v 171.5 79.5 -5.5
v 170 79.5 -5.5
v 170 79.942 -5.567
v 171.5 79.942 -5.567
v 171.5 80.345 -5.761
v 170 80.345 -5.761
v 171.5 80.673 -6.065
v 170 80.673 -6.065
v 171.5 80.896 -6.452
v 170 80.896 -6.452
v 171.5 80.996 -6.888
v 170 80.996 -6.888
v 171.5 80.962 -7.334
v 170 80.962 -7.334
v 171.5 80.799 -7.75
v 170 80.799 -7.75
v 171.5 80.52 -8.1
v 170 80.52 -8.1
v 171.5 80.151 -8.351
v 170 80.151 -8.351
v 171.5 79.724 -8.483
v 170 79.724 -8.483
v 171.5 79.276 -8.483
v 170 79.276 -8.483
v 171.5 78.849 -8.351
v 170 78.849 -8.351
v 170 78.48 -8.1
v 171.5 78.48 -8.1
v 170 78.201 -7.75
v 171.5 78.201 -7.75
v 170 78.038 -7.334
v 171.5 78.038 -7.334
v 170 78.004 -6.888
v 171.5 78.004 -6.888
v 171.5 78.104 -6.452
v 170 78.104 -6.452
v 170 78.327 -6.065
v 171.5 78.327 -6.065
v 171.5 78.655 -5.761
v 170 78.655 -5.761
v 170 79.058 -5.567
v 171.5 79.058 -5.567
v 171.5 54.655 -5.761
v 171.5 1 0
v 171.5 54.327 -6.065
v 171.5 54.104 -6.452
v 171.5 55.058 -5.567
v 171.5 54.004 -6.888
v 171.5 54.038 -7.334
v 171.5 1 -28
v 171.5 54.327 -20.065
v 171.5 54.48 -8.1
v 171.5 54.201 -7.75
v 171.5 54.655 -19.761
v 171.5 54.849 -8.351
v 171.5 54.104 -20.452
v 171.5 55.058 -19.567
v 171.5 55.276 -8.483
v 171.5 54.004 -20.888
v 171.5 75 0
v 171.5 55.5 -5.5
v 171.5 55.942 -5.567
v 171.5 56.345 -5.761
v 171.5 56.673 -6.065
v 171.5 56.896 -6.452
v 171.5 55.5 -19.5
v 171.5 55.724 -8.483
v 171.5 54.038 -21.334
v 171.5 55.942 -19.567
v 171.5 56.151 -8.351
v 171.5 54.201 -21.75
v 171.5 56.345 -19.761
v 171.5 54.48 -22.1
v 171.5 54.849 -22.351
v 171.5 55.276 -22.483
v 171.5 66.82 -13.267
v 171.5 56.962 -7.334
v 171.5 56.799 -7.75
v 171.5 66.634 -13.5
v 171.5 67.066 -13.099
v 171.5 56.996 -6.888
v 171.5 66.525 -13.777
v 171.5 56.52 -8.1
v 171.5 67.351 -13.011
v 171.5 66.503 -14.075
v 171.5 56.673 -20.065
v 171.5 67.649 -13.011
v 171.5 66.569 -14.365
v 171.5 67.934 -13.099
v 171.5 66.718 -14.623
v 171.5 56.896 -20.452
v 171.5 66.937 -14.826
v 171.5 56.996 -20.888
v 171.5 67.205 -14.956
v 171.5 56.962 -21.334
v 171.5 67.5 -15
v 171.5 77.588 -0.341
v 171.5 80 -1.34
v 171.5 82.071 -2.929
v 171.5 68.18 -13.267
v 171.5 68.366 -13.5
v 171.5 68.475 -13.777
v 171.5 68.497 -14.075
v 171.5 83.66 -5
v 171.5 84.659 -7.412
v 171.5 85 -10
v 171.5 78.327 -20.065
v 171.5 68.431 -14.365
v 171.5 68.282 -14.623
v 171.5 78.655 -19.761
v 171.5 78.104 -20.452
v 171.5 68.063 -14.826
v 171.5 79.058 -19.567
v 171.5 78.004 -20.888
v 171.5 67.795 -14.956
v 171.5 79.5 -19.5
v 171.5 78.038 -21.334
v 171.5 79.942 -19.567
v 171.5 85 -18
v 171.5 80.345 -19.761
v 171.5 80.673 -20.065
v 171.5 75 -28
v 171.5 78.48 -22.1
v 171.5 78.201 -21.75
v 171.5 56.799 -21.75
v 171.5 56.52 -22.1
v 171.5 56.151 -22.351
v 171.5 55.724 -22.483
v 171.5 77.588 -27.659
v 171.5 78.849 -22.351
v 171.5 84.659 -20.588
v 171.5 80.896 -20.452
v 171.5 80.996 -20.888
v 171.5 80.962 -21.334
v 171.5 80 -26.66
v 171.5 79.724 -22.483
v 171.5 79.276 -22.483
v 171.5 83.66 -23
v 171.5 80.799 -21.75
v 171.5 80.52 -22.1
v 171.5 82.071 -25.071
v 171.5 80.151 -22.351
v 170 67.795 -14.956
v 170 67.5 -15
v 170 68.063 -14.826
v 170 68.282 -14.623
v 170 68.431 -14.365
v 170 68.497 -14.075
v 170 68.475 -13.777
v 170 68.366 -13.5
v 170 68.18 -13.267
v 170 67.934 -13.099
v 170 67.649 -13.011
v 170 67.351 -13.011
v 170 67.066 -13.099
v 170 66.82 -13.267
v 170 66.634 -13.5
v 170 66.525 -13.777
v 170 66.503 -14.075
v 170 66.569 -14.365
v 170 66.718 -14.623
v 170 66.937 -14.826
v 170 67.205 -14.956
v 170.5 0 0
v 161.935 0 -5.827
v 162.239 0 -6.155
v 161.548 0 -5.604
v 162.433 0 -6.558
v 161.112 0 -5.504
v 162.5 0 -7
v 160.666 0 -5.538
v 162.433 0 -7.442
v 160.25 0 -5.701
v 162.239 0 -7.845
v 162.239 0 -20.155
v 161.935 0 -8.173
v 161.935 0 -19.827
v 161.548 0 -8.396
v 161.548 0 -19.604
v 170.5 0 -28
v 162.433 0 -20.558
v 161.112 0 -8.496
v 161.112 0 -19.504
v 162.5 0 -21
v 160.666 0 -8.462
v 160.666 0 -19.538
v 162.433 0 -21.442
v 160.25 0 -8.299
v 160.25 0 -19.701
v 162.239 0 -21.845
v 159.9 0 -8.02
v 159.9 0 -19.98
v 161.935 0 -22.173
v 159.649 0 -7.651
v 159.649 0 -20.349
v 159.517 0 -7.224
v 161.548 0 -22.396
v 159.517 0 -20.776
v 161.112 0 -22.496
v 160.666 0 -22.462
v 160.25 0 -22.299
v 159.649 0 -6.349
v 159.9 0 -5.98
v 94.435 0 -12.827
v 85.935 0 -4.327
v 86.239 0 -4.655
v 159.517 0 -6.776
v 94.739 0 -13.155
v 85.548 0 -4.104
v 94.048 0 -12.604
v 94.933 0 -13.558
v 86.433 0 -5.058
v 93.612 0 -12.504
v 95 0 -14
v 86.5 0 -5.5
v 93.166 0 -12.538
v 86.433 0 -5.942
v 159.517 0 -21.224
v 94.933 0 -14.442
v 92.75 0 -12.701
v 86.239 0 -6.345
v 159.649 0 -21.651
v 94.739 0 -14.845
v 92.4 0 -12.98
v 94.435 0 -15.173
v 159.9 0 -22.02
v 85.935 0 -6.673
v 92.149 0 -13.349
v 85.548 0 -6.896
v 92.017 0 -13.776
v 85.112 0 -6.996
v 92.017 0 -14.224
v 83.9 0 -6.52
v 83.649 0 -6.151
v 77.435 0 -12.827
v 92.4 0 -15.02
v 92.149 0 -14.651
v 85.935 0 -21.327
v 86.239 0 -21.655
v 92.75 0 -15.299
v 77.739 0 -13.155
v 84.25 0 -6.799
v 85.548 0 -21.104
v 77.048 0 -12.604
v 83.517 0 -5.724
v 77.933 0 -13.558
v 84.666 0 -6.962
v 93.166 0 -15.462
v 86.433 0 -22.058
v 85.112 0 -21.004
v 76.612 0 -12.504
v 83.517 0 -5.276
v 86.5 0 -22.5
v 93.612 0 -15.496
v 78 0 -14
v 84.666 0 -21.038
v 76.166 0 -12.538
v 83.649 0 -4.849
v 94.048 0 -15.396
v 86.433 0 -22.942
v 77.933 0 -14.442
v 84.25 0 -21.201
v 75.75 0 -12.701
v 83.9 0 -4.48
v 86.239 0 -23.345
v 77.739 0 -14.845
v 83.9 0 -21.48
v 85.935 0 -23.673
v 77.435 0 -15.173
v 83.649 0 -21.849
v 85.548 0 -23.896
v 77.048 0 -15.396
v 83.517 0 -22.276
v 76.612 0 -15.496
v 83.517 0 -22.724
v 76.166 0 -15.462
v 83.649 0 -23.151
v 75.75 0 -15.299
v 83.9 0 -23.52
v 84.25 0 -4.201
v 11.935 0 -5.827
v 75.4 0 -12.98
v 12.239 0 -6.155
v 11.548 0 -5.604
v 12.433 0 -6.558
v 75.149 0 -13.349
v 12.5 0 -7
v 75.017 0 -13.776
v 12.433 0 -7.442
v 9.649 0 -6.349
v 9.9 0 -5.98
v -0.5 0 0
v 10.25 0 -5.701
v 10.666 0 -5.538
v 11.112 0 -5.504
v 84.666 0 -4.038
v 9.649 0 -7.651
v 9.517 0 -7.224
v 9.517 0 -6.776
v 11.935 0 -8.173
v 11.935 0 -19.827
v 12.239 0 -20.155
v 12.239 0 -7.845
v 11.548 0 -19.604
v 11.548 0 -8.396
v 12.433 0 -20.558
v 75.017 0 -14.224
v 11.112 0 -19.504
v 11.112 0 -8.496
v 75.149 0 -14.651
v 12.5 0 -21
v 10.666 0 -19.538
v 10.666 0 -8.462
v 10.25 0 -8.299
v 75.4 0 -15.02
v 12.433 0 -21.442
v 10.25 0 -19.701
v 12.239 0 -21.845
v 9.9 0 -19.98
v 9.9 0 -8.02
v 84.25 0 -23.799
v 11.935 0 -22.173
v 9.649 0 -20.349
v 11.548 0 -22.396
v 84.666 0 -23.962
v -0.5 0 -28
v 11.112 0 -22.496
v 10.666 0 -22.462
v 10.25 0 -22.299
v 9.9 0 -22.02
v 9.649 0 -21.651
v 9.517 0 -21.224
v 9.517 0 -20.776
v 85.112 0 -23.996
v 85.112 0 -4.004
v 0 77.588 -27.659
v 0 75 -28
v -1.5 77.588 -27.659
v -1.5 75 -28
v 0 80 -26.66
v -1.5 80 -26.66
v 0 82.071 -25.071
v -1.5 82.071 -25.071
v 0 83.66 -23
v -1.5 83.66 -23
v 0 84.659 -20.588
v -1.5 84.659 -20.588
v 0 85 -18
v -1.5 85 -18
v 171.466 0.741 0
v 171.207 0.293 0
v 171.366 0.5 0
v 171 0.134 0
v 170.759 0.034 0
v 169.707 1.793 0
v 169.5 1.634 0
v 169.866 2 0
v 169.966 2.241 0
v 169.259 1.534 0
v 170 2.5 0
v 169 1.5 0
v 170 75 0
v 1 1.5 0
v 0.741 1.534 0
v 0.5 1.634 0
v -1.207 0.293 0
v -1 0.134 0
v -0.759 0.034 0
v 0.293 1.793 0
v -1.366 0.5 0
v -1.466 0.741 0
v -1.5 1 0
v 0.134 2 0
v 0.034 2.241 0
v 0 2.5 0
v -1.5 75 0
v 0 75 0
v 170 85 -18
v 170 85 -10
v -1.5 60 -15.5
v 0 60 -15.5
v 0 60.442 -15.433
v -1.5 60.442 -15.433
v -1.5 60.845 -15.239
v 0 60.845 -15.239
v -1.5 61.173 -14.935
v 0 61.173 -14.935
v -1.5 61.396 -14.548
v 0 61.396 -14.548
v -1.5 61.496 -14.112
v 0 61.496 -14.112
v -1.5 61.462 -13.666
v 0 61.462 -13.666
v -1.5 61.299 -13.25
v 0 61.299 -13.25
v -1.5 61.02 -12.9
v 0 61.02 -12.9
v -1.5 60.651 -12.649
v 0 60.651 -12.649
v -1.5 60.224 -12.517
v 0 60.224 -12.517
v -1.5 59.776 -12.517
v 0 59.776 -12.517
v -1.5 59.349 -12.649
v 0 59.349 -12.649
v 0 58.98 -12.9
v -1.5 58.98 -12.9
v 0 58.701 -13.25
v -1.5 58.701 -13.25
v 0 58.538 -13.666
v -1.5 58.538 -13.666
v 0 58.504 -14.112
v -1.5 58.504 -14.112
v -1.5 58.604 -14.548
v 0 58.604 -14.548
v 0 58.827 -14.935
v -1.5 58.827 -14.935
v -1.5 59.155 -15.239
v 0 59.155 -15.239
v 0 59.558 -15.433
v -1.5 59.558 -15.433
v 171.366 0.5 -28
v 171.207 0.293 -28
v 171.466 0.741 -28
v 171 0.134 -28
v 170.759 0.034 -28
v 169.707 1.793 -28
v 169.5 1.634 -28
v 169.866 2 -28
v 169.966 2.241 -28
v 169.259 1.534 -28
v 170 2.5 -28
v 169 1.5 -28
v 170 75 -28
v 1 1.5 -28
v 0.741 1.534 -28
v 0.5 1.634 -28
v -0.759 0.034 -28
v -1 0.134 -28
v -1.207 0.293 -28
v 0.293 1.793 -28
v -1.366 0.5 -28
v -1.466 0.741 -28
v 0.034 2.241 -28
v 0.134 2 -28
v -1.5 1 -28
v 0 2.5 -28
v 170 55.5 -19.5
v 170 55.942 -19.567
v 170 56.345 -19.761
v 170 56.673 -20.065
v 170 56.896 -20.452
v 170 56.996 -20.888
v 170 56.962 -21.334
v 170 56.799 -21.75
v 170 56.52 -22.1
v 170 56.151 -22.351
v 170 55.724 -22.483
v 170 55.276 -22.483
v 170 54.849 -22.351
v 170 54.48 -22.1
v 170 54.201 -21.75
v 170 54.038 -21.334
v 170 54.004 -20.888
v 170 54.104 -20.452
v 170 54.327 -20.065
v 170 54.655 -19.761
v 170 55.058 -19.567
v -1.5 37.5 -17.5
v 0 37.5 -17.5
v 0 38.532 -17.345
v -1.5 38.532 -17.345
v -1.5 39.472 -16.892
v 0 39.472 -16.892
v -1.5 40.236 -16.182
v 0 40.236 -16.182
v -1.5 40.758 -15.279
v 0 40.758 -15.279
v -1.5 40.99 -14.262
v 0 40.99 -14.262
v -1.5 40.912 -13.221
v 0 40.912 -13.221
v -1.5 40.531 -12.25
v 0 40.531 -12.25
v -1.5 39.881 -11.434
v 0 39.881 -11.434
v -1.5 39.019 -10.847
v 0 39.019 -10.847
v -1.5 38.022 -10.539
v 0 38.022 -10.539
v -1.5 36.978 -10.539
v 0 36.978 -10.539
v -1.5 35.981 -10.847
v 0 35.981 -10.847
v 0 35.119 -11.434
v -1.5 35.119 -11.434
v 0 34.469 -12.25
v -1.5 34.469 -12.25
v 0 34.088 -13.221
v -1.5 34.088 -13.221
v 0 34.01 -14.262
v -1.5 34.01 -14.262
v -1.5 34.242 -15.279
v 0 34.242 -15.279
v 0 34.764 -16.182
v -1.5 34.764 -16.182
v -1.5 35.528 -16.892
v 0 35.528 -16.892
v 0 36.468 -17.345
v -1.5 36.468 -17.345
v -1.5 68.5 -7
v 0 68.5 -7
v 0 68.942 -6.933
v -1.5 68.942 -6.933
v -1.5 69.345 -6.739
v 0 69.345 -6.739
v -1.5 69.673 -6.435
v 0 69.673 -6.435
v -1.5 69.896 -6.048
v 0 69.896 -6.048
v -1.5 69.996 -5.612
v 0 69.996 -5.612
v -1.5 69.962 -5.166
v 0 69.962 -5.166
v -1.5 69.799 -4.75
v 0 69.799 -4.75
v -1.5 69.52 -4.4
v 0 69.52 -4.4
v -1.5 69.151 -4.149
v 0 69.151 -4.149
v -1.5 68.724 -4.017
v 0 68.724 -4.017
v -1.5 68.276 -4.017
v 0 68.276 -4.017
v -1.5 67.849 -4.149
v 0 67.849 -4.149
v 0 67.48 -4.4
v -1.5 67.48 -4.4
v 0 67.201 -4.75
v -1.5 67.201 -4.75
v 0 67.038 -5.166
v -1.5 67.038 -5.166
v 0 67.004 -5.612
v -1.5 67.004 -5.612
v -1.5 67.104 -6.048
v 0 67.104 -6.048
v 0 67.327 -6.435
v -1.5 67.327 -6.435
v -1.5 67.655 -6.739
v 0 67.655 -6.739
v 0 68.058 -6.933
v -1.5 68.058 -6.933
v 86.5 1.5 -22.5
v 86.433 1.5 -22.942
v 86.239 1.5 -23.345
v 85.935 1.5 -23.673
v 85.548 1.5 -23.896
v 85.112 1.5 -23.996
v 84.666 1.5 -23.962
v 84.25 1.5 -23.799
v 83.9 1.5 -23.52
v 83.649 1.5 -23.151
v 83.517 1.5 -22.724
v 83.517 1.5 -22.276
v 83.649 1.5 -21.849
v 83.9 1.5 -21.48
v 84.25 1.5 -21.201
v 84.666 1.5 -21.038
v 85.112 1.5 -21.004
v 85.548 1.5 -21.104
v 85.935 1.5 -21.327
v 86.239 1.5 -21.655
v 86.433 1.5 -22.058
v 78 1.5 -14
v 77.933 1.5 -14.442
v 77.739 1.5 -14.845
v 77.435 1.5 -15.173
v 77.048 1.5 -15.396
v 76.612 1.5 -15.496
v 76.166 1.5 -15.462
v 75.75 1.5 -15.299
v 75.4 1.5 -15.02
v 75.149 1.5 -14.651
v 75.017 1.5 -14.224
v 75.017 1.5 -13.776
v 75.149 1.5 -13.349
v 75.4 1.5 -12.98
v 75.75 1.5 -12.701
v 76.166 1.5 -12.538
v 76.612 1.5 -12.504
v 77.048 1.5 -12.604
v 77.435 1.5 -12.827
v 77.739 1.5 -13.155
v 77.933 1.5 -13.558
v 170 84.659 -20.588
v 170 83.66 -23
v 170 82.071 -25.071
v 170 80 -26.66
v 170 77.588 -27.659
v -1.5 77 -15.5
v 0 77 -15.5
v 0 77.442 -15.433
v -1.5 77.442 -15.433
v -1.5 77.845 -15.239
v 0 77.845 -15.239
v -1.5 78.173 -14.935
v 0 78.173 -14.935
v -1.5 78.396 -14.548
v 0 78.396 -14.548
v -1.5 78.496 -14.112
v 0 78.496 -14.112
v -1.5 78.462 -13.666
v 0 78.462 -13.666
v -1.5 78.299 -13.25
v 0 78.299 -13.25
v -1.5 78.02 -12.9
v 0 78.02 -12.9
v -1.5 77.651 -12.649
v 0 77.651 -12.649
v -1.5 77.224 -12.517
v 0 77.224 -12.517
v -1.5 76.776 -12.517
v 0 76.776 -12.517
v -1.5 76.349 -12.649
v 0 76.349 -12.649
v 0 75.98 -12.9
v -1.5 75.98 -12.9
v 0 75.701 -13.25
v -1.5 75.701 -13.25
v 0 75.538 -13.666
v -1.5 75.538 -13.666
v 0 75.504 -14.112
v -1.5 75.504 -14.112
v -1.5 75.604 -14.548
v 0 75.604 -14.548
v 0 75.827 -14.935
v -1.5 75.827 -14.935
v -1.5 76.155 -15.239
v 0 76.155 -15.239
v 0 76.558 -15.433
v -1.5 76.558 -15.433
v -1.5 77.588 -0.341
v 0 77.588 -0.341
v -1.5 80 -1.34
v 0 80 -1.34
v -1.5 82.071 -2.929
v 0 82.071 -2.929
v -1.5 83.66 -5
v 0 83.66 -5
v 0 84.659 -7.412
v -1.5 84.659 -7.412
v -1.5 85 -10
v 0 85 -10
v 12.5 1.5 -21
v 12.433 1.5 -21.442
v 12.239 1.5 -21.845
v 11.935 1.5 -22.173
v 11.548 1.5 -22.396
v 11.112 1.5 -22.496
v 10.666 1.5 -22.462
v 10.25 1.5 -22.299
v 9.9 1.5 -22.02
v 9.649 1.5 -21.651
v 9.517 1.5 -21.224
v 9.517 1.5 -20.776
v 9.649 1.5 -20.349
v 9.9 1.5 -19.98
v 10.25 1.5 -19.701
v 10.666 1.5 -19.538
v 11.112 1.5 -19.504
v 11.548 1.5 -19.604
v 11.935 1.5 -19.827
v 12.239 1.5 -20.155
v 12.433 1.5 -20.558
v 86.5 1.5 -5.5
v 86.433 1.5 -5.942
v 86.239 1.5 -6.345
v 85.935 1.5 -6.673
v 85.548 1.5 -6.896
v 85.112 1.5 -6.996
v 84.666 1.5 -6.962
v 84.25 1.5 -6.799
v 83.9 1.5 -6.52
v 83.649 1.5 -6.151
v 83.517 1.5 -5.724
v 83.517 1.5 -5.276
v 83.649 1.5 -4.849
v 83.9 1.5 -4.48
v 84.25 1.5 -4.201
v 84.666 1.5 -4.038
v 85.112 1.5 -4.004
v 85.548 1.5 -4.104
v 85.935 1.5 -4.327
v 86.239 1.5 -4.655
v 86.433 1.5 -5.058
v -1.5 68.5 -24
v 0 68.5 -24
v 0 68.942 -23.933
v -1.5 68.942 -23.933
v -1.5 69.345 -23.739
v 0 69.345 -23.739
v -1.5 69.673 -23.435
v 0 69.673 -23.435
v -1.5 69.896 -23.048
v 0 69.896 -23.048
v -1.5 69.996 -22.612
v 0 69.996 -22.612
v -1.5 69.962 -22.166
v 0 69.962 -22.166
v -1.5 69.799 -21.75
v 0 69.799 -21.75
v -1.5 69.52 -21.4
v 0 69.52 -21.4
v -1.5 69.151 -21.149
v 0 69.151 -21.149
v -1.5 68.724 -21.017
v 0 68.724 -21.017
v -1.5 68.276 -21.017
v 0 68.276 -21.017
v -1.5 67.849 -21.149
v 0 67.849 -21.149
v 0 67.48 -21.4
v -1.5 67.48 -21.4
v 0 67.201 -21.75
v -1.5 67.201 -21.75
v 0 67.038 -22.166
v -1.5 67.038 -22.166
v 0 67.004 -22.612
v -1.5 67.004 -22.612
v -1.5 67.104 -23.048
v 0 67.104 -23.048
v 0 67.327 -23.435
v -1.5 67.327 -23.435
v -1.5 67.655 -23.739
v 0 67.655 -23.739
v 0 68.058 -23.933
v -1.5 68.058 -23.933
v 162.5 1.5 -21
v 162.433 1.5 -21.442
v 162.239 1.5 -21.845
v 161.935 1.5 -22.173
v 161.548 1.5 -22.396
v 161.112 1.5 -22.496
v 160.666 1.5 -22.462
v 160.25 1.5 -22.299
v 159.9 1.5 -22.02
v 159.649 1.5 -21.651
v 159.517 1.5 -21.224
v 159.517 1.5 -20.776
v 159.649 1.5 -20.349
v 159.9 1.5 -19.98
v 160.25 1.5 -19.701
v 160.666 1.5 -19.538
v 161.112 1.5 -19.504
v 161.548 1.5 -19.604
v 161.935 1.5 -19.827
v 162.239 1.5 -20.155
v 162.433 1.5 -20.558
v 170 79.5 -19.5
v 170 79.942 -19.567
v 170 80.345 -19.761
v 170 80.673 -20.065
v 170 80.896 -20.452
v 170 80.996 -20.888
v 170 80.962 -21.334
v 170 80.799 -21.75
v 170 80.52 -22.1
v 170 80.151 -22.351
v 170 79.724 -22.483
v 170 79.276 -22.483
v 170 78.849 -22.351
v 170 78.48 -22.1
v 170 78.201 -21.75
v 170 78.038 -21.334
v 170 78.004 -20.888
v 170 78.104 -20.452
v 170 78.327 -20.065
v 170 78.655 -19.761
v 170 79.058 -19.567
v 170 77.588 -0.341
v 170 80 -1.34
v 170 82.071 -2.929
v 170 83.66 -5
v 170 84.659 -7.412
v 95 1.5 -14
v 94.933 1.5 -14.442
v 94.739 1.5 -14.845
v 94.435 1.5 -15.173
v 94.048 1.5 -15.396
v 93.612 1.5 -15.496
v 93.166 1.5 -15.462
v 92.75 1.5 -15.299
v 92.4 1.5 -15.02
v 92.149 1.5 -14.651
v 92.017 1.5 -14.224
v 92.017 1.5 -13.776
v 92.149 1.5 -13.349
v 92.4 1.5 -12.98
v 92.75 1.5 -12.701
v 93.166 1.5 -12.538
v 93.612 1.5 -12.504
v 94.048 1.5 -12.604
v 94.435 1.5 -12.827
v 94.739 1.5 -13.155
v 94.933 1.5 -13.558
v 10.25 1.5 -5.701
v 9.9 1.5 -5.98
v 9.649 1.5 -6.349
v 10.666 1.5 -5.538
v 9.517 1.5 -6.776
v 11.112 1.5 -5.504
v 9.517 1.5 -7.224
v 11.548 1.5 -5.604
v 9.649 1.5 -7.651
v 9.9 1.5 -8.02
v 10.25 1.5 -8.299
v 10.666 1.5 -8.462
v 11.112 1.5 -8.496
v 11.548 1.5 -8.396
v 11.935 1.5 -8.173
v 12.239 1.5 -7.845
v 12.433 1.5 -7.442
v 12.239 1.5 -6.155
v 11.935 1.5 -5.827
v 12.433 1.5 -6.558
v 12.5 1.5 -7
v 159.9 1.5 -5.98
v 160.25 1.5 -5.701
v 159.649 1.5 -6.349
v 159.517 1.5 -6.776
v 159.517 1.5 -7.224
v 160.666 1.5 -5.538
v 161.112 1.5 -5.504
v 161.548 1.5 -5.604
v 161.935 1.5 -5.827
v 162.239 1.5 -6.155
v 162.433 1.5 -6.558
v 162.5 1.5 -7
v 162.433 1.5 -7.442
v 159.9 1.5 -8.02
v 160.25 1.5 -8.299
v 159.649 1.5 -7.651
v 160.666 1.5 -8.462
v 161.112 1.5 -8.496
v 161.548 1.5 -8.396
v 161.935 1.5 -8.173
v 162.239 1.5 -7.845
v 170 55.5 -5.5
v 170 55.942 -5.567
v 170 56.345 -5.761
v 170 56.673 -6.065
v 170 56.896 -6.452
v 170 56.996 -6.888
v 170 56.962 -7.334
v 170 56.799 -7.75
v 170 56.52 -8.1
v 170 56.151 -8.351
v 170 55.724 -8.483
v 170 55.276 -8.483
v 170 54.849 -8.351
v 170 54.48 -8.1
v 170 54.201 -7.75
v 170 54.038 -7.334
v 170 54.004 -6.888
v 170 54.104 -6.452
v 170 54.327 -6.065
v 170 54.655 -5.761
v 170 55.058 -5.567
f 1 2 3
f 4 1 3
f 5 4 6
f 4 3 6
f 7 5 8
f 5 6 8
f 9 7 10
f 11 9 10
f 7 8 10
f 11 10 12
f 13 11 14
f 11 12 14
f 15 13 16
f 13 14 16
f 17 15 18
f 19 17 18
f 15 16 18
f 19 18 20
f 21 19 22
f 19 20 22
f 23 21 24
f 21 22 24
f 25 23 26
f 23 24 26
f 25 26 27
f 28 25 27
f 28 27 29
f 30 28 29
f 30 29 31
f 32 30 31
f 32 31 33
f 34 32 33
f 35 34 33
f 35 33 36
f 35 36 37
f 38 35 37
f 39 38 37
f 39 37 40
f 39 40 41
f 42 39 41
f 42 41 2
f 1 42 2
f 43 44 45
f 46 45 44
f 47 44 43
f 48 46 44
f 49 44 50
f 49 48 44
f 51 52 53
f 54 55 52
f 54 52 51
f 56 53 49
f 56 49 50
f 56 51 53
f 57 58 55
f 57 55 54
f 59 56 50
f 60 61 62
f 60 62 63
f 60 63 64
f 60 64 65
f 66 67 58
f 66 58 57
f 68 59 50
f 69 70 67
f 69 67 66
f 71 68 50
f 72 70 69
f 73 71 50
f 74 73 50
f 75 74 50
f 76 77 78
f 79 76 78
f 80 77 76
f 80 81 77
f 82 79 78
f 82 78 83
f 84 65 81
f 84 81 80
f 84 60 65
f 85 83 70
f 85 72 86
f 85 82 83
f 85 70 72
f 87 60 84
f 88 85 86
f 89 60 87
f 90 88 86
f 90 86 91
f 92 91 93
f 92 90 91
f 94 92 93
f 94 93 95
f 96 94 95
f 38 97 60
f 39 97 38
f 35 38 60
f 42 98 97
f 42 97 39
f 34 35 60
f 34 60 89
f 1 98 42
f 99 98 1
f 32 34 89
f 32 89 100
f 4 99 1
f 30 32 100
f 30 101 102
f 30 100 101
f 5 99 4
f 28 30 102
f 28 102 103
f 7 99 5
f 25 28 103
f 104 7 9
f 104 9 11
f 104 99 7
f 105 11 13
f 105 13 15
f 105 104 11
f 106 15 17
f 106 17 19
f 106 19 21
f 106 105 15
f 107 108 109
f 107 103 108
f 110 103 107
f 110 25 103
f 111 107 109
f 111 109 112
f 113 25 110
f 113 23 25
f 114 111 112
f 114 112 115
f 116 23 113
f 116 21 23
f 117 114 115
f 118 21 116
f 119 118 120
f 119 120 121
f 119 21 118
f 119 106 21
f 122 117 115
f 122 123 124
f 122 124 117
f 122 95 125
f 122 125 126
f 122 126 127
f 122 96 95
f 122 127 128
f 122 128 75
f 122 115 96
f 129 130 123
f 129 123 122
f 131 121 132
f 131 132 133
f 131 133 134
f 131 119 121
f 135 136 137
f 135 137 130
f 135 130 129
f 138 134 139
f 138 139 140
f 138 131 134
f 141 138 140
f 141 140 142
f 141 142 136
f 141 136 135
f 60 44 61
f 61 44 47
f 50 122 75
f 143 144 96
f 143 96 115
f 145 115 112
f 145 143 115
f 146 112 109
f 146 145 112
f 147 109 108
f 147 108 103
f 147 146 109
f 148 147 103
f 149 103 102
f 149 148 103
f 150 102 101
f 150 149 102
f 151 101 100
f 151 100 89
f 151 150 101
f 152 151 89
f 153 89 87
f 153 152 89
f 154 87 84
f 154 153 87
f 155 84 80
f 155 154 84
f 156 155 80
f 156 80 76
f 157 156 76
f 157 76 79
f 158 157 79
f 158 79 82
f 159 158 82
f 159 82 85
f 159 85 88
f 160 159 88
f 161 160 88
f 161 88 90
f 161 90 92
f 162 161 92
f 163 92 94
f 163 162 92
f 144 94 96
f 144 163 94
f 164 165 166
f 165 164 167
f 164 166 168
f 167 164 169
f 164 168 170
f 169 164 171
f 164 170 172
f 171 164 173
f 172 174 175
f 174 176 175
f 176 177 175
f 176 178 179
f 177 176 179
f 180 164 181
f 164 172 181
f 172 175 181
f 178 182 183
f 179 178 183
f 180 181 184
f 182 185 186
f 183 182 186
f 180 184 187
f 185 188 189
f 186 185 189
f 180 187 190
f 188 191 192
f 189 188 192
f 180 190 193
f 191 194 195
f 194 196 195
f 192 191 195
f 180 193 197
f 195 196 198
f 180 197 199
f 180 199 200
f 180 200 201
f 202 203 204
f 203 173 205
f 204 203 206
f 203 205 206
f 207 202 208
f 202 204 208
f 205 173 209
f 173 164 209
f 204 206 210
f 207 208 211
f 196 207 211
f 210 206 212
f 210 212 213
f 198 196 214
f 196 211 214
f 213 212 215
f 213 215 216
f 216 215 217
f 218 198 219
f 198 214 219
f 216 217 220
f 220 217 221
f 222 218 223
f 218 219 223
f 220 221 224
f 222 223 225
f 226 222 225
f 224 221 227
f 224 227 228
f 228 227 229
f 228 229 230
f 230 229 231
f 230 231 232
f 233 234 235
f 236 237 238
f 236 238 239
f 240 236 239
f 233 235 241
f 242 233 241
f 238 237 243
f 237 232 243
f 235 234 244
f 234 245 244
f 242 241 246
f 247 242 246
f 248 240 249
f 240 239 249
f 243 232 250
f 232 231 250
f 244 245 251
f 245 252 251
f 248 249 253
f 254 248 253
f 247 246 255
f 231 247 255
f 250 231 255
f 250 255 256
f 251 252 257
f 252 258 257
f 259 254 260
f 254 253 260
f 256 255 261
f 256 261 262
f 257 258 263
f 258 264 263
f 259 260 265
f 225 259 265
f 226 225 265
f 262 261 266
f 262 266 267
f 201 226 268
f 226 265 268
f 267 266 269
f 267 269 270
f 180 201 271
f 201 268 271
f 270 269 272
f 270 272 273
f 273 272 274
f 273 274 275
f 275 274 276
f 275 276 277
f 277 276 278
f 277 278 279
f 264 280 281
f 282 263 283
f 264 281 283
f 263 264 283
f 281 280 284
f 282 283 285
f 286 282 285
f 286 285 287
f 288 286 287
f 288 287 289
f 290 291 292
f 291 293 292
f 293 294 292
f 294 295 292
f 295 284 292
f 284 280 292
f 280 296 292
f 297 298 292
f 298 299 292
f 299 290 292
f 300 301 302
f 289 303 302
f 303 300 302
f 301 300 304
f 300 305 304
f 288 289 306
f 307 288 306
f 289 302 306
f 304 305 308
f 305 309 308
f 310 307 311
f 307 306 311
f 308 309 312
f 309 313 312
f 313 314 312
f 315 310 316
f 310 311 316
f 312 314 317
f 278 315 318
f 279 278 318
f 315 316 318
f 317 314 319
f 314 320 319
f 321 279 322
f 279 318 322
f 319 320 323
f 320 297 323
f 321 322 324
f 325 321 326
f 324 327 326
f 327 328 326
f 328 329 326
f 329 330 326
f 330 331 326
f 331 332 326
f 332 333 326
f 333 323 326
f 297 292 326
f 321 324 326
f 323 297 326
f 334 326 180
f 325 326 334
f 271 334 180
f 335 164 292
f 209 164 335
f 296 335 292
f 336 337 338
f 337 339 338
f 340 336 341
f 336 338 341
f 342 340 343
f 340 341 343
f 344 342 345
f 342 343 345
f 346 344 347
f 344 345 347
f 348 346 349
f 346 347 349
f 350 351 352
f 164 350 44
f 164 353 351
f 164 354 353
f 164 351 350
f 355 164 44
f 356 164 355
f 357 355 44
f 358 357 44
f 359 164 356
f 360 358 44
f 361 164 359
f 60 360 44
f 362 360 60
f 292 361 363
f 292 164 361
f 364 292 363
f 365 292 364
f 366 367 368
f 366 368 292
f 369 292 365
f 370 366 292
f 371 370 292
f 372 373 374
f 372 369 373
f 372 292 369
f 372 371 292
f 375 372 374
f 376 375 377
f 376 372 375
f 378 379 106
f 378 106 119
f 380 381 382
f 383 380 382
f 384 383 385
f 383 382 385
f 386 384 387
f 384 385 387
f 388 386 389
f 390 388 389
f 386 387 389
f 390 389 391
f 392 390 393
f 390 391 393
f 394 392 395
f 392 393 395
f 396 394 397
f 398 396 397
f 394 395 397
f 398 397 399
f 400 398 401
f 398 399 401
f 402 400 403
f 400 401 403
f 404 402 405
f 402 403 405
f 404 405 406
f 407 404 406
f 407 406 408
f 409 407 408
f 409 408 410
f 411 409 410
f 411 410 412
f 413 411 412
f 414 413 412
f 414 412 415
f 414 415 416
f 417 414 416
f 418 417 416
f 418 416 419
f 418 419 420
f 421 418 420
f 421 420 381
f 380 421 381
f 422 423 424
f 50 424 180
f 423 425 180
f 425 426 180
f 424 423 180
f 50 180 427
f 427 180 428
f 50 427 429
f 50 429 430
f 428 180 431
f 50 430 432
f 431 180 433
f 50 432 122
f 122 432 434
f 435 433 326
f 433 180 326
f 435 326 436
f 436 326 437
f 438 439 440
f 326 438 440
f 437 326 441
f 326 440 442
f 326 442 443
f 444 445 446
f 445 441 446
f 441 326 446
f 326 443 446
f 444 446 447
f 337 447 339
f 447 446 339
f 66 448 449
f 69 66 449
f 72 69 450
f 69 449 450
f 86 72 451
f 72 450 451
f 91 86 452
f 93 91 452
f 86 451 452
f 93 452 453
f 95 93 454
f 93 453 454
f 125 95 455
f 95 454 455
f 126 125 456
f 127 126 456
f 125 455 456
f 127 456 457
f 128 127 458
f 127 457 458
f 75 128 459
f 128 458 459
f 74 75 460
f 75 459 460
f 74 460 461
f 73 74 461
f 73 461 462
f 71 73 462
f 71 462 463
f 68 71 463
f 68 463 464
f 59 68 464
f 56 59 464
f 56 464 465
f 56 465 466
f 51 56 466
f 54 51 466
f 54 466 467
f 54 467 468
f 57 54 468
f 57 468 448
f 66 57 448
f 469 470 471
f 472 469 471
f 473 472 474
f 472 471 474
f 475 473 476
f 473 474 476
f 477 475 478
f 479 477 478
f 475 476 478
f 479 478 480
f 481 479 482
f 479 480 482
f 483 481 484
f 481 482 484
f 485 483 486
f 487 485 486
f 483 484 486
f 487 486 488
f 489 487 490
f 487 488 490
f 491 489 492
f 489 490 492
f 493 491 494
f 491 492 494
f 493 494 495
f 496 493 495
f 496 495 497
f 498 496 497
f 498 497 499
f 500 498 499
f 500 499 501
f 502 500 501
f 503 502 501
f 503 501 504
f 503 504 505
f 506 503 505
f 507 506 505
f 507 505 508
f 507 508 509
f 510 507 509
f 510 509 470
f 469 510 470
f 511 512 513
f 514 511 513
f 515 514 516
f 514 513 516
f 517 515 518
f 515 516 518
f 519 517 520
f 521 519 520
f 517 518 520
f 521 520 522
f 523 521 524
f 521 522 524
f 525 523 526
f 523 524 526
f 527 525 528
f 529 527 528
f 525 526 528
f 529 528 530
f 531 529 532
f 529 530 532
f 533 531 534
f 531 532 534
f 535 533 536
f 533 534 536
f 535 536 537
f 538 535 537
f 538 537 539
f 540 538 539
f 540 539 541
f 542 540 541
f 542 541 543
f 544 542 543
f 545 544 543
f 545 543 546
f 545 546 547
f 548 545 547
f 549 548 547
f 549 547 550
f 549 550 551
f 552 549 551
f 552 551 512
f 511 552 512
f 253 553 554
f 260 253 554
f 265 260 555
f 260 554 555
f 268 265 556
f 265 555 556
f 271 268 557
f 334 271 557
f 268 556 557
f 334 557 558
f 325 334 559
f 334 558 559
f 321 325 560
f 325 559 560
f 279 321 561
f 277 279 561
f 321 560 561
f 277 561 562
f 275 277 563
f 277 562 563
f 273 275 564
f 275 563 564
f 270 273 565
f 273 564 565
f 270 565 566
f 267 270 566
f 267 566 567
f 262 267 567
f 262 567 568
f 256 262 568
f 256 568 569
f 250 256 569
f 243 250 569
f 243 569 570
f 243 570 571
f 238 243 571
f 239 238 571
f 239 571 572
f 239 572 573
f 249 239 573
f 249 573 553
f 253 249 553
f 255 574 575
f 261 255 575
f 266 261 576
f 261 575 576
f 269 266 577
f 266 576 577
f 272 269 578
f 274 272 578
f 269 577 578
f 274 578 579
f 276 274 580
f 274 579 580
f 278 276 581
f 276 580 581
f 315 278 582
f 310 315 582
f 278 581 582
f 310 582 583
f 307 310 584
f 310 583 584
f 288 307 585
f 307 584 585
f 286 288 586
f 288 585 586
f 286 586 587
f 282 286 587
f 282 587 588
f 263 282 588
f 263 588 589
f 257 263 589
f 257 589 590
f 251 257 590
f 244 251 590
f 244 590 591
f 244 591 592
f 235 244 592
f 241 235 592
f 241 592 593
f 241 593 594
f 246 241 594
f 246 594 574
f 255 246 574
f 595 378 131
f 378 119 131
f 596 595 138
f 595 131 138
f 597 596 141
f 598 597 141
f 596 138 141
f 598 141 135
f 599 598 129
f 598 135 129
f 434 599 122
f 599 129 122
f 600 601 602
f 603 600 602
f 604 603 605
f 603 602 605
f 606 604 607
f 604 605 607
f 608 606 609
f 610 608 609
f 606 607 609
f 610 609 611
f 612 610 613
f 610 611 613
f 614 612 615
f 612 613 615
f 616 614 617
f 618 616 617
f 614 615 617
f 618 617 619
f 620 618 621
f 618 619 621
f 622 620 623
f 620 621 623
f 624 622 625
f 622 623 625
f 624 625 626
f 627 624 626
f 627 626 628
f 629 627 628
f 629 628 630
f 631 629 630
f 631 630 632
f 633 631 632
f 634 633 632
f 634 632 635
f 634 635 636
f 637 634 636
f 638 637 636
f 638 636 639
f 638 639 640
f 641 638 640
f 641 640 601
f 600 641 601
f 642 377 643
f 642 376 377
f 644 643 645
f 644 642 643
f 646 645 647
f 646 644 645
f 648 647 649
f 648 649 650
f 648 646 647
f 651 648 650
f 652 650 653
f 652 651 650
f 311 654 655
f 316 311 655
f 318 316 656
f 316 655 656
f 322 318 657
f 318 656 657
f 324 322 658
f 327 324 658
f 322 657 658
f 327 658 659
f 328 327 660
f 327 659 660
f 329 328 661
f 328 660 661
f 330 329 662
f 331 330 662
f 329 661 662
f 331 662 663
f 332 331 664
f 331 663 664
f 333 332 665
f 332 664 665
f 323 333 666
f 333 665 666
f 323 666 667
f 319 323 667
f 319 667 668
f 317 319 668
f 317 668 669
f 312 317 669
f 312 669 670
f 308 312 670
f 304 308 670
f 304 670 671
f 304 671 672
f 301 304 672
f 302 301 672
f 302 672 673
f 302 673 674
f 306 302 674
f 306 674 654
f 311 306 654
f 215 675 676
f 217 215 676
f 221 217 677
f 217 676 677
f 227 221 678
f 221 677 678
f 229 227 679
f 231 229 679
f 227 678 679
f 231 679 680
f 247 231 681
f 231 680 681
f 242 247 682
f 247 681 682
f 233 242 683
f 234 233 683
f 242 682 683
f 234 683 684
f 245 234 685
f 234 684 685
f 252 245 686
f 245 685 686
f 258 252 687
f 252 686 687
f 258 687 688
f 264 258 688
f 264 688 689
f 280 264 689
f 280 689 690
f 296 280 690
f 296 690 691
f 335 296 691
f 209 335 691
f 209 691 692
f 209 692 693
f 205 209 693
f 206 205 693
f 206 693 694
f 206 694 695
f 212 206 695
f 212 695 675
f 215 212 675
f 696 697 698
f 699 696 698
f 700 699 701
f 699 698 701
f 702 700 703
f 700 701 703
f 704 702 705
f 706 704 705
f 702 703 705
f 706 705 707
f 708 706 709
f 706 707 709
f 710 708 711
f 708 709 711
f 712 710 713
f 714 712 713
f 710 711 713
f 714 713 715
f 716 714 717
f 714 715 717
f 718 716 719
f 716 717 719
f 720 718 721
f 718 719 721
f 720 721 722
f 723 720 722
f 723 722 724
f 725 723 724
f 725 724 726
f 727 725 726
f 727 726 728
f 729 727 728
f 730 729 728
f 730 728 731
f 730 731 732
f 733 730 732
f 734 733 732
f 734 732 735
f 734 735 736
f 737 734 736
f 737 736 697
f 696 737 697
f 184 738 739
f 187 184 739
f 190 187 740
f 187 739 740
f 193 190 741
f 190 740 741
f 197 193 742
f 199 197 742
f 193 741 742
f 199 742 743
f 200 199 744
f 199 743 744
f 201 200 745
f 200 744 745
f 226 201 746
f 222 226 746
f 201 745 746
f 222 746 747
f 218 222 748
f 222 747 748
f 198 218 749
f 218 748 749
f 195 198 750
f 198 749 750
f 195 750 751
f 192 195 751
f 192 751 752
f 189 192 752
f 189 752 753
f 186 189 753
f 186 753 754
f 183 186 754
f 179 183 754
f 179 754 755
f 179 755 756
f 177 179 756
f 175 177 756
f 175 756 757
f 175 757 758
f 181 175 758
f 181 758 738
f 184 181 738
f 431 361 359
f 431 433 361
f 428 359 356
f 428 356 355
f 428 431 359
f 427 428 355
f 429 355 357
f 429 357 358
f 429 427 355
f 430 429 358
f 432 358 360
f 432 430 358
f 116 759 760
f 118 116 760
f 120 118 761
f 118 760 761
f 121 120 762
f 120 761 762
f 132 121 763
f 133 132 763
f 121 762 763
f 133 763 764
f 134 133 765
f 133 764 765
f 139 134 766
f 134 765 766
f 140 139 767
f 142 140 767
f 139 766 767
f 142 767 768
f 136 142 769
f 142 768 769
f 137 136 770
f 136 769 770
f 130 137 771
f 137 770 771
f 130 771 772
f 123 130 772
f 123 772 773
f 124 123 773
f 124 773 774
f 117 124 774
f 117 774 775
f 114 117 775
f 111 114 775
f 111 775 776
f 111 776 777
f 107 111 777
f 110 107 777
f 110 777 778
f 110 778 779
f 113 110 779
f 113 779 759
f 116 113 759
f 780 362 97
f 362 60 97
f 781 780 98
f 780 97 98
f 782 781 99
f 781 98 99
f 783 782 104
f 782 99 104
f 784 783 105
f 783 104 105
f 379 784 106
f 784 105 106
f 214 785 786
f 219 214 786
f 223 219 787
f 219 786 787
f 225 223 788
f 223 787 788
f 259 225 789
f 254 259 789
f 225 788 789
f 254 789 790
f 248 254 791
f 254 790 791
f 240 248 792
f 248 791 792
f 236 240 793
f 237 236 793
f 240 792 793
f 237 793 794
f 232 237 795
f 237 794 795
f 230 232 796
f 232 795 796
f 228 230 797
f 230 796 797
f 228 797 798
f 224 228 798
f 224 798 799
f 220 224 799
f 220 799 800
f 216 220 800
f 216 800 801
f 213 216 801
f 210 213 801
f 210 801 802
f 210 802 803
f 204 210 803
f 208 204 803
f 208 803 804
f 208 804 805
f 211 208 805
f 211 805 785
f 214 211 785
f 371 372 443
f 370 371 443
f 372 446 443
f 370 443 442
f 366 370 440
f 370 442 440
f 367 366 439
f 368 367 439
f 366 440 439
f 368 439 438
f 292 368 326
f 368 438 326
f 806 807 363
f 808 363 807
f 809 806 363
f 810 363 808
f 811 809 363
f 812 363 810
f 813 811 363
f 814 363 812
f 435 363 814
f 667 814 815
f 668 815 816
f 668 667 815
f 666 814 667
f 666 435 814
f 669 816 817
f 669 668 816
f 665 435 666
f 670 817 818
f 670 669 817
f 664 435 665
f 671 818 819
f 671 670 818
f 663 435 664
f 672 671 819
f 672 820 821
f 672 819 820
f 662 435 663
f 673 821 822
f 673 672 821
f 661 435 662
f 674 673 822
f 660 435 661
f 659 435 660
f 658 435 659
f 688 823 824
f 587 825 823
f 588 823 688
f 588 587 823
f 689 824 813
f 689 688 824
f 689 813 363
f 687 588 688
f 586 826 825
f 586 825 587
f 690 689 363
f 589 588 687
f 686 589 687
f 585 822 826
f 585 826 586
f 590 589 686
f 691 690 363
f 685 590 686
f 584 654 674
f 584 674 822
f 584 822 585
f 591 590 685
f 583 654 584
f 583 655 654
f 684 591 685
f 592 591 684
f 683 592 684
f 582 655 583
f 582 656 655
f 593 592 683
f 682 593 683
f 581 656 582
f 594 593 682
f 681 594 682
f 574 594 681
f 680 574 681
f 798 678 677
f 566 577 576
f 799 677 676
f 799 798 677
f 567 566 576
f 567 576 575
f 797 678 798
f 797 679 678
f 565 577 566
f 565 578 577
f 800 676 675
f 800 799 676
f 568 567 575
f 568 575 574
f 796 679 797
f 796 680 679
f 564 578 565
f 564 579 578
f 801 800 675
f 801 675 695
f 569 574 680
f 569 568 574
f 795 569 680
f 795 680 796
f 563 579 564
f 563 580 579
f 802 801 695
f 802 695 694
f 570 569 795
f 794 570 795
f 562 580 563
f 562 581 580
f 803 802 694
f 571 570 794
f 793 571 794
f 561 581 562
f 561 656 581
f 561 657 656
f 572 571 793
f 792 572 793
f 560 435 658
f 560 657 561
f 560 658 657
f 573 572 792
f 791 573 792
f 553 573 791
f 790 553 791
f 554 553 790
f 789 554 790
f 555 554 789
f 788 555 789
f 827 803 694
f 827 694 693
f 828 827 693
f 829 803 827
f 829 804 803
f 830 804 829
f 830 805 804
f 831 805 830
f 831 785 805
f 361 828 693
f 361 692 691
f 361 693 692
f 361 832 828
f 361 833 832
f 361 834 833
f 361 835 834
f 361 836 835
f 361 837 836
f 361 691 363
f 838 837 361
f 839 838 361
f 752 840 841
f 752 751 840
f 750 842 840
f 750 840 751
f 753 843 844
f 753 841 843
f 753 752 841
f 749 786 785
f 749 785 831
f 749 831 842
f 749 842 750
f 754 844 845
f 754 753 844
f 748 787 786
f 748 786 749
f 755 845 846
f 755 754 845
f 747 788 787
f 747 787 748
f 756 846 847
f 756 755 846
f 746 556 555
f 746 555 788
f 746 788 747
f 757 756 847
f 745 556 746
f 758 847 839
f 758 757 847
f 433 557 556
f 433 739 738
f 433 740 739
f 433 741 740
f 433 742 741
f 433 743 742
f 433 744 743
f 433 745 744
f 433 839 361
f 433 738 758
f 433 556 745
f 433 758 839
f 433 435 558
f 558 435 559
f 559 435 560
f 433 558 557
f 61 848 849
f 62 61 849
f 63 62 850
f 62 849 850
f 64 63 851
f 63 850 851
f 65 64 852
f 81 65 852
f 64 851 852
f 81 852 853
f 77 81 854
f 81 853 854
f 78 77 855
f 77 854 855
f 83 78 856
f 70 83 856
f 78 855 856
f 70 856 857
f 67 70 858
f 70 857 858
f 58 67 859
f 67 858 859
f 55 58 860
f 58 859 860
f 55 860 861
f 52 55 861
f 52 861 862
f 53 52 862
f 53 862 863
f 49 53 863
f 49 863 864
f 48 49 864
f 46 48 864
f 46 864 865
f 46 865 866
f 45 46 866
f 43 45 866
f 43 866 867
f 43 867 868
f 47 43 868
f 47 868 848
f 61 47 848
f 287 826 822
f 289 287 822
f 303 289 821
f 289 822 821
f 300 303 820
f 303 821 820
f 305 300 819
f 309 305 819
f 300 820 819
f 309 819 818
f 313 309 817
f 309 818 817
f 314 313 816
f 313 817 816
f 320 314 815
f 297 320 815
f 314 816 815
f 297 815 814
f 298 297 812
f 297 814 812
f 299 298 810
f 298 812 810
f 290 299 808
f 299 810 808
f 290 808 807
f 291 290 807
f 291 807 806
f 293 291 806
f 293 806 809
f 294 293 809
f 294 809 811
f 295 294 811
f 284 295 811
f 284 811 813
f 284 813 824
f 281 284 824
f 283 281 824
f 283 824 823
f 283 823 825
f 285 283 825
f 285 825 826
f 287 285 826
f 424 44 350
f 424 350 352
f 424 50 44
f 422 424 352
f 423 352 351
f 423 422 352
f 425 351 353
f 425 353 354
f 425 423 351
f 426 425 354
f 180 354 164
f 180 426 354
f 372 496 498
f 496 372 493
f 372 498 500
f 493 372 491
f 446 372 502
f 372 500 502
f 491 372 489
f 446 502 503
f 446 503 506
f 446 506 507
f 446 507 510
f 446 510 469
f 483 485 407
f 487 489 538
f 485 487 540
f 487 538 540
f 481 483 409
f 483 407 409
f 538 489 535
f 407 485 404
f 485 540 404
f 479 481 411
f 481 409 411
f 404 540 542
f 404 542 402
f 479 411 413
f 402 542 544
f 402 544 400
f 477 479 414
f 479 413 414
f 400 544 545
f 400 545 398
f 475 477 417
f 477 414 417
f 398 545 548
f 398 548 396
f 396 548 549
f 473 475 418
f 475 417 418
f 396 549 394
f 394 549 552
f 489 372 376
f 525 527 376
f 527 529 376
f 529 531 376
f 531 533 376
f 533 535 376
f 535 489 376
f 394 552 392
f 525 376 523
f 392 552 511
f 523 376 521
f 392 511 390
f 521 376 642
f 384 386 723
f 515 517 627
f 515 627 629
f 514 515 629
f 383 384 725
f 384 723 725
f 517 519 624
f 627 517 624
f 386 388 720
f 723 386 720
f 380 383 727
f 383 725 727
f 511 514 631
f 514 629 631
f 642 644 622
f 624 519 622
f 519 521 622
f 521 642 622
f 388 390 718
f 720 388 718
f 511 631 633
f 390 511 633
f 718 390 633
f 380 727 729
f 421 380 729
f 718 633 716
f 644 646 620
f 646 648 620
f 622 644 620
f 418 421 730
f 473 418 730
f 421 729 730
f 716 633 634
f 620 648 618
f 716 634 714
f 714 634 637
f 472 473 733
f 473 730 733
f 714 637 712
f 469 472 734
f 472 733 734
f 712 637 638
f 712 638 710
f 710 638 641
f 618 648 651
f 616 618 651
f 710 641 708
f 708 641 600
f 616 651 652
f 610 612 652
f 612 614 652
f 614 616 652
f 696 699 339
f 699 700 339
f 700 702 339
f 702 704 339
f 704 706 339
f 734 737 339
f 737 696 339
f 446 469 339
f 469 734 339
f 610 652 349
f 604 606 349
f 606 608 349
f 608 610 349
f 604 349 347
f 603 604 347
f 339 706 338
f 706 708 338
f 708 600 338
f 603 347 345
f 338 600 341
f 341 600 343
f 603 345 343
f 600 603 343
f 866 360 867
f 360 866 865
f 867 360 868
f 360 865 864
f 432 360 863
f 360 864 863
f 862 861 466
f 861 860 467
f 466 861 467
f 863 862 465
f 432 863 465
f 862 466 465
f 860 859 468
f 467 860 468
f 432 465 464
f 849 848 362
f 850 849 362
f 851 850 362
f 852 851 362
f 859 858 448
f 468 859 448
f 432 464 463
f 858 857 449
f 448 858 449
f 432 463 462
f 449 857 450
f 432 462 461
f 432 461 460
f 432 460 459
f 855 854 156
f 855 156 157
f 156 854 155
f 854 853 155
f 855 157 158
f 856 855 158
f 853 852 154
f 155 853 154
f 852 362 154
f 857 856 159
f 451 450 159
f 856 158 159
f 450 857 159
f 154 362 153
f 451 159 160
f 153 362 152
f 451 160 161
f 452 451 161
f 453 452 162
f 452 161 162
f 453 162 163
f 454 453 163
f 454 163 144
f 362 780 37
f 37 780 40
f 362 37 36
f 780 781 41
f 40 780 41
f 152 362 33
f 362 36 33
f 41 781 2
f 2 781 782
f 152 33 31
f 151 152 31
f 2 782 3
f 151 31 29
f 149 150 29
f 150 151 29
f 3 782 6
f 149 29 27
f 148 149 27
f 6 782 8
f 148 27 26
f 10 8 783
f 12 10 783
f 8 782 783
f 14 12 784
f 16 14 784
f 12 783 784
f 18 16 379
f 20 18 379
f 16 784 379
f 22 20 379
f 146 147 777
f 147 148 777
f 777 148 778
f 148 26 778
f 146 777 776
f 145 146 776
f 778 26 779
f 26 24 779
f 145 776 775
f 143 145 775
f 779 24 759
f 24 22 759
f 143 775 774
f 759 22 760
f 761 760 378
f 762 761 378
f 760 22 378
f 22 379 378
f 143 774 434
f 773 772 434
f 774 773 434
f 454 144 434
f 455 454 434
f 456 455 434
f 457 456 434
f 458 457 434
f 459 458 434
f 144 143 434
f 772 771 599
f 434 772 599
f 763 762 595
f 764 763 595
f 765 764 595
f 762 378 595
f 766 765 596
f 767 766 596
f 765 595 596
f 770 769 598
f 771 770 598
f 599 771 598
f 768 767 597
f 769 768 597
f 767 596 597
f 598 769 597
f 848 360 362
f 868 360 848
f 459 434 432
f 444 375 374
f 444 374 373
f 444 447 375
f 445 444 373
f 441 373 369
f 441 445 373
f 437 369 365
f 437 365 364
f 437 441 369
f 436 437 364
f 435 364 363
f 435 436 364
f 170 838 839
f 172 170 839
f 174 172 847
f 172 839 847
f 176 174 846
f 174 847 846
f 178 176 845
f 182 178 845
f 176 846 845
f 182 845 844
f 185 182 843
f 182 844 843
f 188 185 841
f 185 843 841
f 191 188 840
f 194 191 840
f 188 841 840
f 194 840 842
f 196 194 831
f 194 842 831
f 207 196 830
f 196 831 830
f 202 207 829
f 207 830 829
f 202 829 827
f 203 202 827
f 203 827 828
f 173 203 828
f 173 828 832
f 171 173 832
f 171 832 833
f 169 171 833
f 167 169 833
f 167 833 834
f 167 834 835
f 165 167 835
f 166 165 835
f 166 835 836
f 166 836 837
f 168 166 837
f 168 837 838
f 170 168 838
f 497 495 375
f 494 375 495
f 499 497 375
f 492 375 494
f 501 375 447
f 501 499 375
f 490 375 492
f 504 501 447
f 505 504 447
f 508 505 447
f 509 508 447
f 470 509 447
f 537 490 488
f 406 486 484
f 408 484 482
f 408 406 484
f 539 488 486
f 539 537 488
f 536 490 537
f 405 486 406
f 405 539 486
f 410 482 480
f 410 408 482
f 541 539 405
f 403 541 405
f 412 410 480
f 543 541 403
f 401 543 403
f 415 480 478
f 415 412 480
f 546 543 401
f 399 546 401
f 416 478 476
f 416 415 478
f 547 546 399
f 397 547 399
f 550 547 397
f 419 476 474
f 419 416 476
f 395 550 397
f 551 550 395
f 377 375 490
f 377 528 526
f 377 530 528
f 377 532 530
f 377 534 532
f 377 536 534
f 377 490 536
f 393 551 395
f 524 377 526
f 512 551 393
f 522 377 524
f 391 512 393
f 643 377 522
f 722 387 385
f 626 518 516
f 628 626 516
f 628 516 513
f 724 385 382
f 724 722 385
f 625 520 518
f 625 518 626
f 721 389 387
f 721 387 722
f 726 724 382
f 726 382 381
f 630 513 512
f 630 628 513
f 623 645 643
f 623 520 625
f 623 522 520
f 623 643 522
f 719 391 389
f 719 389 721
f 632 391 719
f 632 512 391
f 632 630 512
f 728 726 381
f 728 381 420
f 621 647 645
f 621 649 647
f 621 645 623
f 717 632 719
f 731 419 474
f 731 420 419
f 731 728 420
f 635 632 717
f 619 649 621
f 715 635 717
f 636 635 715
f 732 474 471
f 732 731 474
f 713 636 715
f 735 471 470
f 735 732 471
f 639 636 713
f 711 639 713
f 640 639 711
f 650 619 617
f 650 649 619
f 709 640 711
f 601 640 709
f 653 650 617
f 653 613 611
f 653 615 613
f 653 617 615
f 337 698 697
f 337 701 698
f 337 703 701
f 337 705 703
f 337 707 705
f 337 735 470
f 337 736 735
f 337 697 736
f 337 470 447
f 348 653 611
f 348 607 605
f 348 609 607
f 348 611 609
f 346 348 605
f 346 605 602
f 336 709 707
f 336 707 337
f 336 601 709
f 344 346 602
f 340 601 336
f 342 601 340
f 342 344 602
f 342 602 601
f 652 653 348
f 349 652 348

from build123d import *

# Parameters (mm, degrees)
SKETCH1_W               = 170
SKETCH1_H               = 28
BOSS_EXTRUDE1_DEPTH     = 1.5
SKETCH2_W               = 28
SKETCH2_H               = 85
BOSS_EXTRUDE2_DEPTH     = 1.5
FILLET2_R               = 10
FILLET3_R               = 1
FILLET4_R               = 1
SKETCH5_R               = 1.5
CUT_EXTRUDE2_DEPTH      = 15
CUT_EXTRUDE2_DEPTH_BACK = 15
SKETCH7_R               = 3.5
CUT_EXTRUDE3_DEPTH      = 15
CUT_EXTRUDE3_DEPTH_BACK = 15
SKETCH8_R               = 1.5
CUT_EXTRUDE4_DEPTH      = 15
CUT_EXTRUDE4_DEPTH_BACK = 15
SKETCH11_W              = 28
SKETCH11_H              = 85
SKETCH11_R              = 1
BOSS_EXTRUDE5_DEPTH     = 1.5
FILLET5_R               = 1
FILLET6_R               = 1
FILLET7_R               = 10
FILLET8_R               = 10
SKETCH12_R              = 1.5
CUT_EXTRUDE5_DEPTH      = 10
CUT_EXTRUDE5_DEPTH_BACK = 10
SKETCH13_R              = 1.5
CUT_EXTRUDE6_DEPTH      = 10
CUT_EXTRUDE6_DEPTH_BACK = 10


with BuildPart() as part:
    # Sketch1 → Boss-Extrude1 (new body)
    with BuildSketch(Plane(origin=(0, 0, 0), x_dir=(1, 0, 0), z_dir=(0, 1, 0))):
        with Locations((85, 14)):
            Rectangle(SKETCH1_W, SKETCH1_H)
    extrude(amount=BOSS_EXTRUDE1_DEPTH)

    # Sketch2 → Boss-Extrude2 (add)
    with BuildSketch(Plane(origin=(0, 0, 0), x_dir=(0, 0, -1), z_dir=(1, 0, 0))):
        with Locations((14, 42.5)):
            Rectangle(SKETCH2_W, SKETCH2_H)
    extrude(amount=-BOSS_EXTRUDE2_DEPTH)

    # Fillet2
    fillet2_edges = [part.edges().sort_by_distance(p)[0] for p in [
        (-0.75, 85, -28),
        (-0.75, 85, 0),
    ]]
    fillet(fillet2_edges, radius=FILLET2_R)

    # Fillet3
    fillet3_edges = [part.edges().sort_by_distance(p)[0] for p in [
        (-1.5, 0, -14),
    ]]
    fillet(fillet3_edges, radius=FILLET3_R)

    # Fillet4
    fillet4_edges = [part.edges().sort_by_distance(p)[0] for p in [
        (0, 1.5, -14),
    ]]
    fillet(fillet4_edges, radius=FILLET4_R)

    # Sketch5 → Cut-Extrude2 (cut, two sides)
    with BuildSketch(Plane(origin=(0, 0, 0), x_dir=(0, 0, -1), z_dir=(1, 0, 0))) as cut_extrude2_sk:
        with Locations((14, 77)):
            Circle(SKETCH5_R)
        with Locations((14, 60)):
            Circle(SKETCH5_R)
        with Locations((22.5, 68.5)):
            Circle(SKETCH5_R)
        with Locations((5.5, 68.5)):
            Circle(SKETCH5_R)
    extrude(amount=CUT_EXTRUDE2_DEPTH, mode=Mode.SUBTRACT)
    extrude(cut_extrude2_sk.sketch, amount=-CUT_EXTRUDE2_DEPTH_BACK, mode=Mode.SUBTRACT)

    # Sketch7 → Cut-Extrude3 (cut, two sides)
    with BuildSketch(Plane(origin=(0, 0, 0), x_dir=(0, 0, -1), z_dir=(1, 0, 0))) as cut_extrude3_sk:
        with Locations((14, 37.5)):
            Circle(SKETCH7_R)
    extrude(amount=CUT_EXTRUDE3_DEPTH, mode=Mode.SUBTRACT)
    extrude(cut_extrude3_sk.sketch, amount=-CUT_EXTRUDE3_DEPTH_BACK, mode=Mode.SUBTRACT)

    # Sketch8 → Cut-Extrude4 (cut, two sides)
    with BuildSketch(Plane(origin=(0, 1.5, 0), x_dir=(1, 0, 0), z_dir=(0, 1, 0))) as cut_extrude4_sk:
        with Locations((161, 7)):
            Circle(SKETCH8_R)
        with Locations((11, 21)):
            Circle(SKETCH8_R)
        with Locations((11, 7)):
            Circle(SKETCH8_R)
        with Locations((161, 21)):
            Circle(SKETCH8_R)
    extrude(amount=CUT_EXTRUDE4_DEPTH, mode=Mode.SUBTRACT)
    extrude(cut_extrude4_sk.sketch, amount=-CUT_EXTRUDE4_DEPTH_BACK, mode=Mode.SUBTRACT)

    # Sketch11 → Boss-Extrude5 (add)
    with BuildSketch(Plane(origin=(170, 0, 0), x_dir=(0, 0, -1), z_dir=(1, 0, 0))):
        with Locations((14, 42.5)):
            Rectangle(SKETCH11_W, SKETCH11_H)
        with Locations((14, 67.5)):
            Circle(SKETCH11_R, mode=Mode.SUBTRACT)
    extrude(amount=BOSS_EXTRUDE5_DEPTH)

    # Fillet5
    fillet5_edges = [part.edges().sort_by_distance(p)[0] for p in [
        (170, 1.5, -14),
    ]]
    fillet(fillet5_edges, radius=FILLET5_R)

    # Fillet6
    fillet6_edges = [part.edges().sort_by_distance(p)[0] for p in [
        (171.5, 0, -14),
    ]]
    fillet(fillet6_edges, radius=FILLET6_R)

    # Fillet7
    fillet7_edges = [part.edges().sort_by_distance(p)[0] for p in [
        (170.75, 85, 0),
    ]]
    fillet(fillet7_edges, radius=FILLET7_R)

    # Fillet8
    fillet8_edges = [part.edges().sort_by_distance(p)[0] for p in [
        (170.75, 85, -28),
    ]]
    fillet(fillet8_edges, radius=FILLET8_R)

    # Sketch12 → Cut-Extrude5 (cut, two sides)
    with BuildSketch(Plane.ZY.offset(-170)) as cut_extrude5_sk:
        with Locations((-21, 79.5)):
            Circle(SKETCH12_R)
        with Locations((-7, 79.5)):
            Circle(SKETCH12_R)
        with Locations((-7, 55.5)):
            Circle(SKETCH12_R)
        with Locations((-21, 55.5)):
            Circle(SKETCH12_R)
    extrude(amount=CUT_EXTRUDE5_DEPTH, mode=Mode.SUBTRACT)
    extrude(cut_extrude5_sk.sketch, amount=-CUT_EXTRUDE5_DEPTH_BACK, mode=Mode.SUBTRACT)

    # Sketch13 → Cut-Extrude6 (cut, two sides)
    with BuildSketch(Plane(origin=(0, 1.5, 0), x_dir=(1, 0, 0), z_dir=(0, 1, 0))) as cut_extrude6_sk:
        with Locations((85, 22.5)):
            Circle(SKETCH13_R)
        with Locations((85, 5.5)):
            Circle(SKETCH13_R)
        with Locations((93.5, 14)):
            Circle(SKETCH13_R)
        with Locations((76.5, 14)):
            Circle(SKETCH13_R)
    extrude(amount=CUT_EXTRUDE6_DEPTH, mode=Mode.SUBTRACT)
    extrude(cut_extrude6_sk.sketch, amount=-CUT_EXTRUDE6_DEPTH_BACK, mode=Mode.SUBTRACT)


solid = part.part
